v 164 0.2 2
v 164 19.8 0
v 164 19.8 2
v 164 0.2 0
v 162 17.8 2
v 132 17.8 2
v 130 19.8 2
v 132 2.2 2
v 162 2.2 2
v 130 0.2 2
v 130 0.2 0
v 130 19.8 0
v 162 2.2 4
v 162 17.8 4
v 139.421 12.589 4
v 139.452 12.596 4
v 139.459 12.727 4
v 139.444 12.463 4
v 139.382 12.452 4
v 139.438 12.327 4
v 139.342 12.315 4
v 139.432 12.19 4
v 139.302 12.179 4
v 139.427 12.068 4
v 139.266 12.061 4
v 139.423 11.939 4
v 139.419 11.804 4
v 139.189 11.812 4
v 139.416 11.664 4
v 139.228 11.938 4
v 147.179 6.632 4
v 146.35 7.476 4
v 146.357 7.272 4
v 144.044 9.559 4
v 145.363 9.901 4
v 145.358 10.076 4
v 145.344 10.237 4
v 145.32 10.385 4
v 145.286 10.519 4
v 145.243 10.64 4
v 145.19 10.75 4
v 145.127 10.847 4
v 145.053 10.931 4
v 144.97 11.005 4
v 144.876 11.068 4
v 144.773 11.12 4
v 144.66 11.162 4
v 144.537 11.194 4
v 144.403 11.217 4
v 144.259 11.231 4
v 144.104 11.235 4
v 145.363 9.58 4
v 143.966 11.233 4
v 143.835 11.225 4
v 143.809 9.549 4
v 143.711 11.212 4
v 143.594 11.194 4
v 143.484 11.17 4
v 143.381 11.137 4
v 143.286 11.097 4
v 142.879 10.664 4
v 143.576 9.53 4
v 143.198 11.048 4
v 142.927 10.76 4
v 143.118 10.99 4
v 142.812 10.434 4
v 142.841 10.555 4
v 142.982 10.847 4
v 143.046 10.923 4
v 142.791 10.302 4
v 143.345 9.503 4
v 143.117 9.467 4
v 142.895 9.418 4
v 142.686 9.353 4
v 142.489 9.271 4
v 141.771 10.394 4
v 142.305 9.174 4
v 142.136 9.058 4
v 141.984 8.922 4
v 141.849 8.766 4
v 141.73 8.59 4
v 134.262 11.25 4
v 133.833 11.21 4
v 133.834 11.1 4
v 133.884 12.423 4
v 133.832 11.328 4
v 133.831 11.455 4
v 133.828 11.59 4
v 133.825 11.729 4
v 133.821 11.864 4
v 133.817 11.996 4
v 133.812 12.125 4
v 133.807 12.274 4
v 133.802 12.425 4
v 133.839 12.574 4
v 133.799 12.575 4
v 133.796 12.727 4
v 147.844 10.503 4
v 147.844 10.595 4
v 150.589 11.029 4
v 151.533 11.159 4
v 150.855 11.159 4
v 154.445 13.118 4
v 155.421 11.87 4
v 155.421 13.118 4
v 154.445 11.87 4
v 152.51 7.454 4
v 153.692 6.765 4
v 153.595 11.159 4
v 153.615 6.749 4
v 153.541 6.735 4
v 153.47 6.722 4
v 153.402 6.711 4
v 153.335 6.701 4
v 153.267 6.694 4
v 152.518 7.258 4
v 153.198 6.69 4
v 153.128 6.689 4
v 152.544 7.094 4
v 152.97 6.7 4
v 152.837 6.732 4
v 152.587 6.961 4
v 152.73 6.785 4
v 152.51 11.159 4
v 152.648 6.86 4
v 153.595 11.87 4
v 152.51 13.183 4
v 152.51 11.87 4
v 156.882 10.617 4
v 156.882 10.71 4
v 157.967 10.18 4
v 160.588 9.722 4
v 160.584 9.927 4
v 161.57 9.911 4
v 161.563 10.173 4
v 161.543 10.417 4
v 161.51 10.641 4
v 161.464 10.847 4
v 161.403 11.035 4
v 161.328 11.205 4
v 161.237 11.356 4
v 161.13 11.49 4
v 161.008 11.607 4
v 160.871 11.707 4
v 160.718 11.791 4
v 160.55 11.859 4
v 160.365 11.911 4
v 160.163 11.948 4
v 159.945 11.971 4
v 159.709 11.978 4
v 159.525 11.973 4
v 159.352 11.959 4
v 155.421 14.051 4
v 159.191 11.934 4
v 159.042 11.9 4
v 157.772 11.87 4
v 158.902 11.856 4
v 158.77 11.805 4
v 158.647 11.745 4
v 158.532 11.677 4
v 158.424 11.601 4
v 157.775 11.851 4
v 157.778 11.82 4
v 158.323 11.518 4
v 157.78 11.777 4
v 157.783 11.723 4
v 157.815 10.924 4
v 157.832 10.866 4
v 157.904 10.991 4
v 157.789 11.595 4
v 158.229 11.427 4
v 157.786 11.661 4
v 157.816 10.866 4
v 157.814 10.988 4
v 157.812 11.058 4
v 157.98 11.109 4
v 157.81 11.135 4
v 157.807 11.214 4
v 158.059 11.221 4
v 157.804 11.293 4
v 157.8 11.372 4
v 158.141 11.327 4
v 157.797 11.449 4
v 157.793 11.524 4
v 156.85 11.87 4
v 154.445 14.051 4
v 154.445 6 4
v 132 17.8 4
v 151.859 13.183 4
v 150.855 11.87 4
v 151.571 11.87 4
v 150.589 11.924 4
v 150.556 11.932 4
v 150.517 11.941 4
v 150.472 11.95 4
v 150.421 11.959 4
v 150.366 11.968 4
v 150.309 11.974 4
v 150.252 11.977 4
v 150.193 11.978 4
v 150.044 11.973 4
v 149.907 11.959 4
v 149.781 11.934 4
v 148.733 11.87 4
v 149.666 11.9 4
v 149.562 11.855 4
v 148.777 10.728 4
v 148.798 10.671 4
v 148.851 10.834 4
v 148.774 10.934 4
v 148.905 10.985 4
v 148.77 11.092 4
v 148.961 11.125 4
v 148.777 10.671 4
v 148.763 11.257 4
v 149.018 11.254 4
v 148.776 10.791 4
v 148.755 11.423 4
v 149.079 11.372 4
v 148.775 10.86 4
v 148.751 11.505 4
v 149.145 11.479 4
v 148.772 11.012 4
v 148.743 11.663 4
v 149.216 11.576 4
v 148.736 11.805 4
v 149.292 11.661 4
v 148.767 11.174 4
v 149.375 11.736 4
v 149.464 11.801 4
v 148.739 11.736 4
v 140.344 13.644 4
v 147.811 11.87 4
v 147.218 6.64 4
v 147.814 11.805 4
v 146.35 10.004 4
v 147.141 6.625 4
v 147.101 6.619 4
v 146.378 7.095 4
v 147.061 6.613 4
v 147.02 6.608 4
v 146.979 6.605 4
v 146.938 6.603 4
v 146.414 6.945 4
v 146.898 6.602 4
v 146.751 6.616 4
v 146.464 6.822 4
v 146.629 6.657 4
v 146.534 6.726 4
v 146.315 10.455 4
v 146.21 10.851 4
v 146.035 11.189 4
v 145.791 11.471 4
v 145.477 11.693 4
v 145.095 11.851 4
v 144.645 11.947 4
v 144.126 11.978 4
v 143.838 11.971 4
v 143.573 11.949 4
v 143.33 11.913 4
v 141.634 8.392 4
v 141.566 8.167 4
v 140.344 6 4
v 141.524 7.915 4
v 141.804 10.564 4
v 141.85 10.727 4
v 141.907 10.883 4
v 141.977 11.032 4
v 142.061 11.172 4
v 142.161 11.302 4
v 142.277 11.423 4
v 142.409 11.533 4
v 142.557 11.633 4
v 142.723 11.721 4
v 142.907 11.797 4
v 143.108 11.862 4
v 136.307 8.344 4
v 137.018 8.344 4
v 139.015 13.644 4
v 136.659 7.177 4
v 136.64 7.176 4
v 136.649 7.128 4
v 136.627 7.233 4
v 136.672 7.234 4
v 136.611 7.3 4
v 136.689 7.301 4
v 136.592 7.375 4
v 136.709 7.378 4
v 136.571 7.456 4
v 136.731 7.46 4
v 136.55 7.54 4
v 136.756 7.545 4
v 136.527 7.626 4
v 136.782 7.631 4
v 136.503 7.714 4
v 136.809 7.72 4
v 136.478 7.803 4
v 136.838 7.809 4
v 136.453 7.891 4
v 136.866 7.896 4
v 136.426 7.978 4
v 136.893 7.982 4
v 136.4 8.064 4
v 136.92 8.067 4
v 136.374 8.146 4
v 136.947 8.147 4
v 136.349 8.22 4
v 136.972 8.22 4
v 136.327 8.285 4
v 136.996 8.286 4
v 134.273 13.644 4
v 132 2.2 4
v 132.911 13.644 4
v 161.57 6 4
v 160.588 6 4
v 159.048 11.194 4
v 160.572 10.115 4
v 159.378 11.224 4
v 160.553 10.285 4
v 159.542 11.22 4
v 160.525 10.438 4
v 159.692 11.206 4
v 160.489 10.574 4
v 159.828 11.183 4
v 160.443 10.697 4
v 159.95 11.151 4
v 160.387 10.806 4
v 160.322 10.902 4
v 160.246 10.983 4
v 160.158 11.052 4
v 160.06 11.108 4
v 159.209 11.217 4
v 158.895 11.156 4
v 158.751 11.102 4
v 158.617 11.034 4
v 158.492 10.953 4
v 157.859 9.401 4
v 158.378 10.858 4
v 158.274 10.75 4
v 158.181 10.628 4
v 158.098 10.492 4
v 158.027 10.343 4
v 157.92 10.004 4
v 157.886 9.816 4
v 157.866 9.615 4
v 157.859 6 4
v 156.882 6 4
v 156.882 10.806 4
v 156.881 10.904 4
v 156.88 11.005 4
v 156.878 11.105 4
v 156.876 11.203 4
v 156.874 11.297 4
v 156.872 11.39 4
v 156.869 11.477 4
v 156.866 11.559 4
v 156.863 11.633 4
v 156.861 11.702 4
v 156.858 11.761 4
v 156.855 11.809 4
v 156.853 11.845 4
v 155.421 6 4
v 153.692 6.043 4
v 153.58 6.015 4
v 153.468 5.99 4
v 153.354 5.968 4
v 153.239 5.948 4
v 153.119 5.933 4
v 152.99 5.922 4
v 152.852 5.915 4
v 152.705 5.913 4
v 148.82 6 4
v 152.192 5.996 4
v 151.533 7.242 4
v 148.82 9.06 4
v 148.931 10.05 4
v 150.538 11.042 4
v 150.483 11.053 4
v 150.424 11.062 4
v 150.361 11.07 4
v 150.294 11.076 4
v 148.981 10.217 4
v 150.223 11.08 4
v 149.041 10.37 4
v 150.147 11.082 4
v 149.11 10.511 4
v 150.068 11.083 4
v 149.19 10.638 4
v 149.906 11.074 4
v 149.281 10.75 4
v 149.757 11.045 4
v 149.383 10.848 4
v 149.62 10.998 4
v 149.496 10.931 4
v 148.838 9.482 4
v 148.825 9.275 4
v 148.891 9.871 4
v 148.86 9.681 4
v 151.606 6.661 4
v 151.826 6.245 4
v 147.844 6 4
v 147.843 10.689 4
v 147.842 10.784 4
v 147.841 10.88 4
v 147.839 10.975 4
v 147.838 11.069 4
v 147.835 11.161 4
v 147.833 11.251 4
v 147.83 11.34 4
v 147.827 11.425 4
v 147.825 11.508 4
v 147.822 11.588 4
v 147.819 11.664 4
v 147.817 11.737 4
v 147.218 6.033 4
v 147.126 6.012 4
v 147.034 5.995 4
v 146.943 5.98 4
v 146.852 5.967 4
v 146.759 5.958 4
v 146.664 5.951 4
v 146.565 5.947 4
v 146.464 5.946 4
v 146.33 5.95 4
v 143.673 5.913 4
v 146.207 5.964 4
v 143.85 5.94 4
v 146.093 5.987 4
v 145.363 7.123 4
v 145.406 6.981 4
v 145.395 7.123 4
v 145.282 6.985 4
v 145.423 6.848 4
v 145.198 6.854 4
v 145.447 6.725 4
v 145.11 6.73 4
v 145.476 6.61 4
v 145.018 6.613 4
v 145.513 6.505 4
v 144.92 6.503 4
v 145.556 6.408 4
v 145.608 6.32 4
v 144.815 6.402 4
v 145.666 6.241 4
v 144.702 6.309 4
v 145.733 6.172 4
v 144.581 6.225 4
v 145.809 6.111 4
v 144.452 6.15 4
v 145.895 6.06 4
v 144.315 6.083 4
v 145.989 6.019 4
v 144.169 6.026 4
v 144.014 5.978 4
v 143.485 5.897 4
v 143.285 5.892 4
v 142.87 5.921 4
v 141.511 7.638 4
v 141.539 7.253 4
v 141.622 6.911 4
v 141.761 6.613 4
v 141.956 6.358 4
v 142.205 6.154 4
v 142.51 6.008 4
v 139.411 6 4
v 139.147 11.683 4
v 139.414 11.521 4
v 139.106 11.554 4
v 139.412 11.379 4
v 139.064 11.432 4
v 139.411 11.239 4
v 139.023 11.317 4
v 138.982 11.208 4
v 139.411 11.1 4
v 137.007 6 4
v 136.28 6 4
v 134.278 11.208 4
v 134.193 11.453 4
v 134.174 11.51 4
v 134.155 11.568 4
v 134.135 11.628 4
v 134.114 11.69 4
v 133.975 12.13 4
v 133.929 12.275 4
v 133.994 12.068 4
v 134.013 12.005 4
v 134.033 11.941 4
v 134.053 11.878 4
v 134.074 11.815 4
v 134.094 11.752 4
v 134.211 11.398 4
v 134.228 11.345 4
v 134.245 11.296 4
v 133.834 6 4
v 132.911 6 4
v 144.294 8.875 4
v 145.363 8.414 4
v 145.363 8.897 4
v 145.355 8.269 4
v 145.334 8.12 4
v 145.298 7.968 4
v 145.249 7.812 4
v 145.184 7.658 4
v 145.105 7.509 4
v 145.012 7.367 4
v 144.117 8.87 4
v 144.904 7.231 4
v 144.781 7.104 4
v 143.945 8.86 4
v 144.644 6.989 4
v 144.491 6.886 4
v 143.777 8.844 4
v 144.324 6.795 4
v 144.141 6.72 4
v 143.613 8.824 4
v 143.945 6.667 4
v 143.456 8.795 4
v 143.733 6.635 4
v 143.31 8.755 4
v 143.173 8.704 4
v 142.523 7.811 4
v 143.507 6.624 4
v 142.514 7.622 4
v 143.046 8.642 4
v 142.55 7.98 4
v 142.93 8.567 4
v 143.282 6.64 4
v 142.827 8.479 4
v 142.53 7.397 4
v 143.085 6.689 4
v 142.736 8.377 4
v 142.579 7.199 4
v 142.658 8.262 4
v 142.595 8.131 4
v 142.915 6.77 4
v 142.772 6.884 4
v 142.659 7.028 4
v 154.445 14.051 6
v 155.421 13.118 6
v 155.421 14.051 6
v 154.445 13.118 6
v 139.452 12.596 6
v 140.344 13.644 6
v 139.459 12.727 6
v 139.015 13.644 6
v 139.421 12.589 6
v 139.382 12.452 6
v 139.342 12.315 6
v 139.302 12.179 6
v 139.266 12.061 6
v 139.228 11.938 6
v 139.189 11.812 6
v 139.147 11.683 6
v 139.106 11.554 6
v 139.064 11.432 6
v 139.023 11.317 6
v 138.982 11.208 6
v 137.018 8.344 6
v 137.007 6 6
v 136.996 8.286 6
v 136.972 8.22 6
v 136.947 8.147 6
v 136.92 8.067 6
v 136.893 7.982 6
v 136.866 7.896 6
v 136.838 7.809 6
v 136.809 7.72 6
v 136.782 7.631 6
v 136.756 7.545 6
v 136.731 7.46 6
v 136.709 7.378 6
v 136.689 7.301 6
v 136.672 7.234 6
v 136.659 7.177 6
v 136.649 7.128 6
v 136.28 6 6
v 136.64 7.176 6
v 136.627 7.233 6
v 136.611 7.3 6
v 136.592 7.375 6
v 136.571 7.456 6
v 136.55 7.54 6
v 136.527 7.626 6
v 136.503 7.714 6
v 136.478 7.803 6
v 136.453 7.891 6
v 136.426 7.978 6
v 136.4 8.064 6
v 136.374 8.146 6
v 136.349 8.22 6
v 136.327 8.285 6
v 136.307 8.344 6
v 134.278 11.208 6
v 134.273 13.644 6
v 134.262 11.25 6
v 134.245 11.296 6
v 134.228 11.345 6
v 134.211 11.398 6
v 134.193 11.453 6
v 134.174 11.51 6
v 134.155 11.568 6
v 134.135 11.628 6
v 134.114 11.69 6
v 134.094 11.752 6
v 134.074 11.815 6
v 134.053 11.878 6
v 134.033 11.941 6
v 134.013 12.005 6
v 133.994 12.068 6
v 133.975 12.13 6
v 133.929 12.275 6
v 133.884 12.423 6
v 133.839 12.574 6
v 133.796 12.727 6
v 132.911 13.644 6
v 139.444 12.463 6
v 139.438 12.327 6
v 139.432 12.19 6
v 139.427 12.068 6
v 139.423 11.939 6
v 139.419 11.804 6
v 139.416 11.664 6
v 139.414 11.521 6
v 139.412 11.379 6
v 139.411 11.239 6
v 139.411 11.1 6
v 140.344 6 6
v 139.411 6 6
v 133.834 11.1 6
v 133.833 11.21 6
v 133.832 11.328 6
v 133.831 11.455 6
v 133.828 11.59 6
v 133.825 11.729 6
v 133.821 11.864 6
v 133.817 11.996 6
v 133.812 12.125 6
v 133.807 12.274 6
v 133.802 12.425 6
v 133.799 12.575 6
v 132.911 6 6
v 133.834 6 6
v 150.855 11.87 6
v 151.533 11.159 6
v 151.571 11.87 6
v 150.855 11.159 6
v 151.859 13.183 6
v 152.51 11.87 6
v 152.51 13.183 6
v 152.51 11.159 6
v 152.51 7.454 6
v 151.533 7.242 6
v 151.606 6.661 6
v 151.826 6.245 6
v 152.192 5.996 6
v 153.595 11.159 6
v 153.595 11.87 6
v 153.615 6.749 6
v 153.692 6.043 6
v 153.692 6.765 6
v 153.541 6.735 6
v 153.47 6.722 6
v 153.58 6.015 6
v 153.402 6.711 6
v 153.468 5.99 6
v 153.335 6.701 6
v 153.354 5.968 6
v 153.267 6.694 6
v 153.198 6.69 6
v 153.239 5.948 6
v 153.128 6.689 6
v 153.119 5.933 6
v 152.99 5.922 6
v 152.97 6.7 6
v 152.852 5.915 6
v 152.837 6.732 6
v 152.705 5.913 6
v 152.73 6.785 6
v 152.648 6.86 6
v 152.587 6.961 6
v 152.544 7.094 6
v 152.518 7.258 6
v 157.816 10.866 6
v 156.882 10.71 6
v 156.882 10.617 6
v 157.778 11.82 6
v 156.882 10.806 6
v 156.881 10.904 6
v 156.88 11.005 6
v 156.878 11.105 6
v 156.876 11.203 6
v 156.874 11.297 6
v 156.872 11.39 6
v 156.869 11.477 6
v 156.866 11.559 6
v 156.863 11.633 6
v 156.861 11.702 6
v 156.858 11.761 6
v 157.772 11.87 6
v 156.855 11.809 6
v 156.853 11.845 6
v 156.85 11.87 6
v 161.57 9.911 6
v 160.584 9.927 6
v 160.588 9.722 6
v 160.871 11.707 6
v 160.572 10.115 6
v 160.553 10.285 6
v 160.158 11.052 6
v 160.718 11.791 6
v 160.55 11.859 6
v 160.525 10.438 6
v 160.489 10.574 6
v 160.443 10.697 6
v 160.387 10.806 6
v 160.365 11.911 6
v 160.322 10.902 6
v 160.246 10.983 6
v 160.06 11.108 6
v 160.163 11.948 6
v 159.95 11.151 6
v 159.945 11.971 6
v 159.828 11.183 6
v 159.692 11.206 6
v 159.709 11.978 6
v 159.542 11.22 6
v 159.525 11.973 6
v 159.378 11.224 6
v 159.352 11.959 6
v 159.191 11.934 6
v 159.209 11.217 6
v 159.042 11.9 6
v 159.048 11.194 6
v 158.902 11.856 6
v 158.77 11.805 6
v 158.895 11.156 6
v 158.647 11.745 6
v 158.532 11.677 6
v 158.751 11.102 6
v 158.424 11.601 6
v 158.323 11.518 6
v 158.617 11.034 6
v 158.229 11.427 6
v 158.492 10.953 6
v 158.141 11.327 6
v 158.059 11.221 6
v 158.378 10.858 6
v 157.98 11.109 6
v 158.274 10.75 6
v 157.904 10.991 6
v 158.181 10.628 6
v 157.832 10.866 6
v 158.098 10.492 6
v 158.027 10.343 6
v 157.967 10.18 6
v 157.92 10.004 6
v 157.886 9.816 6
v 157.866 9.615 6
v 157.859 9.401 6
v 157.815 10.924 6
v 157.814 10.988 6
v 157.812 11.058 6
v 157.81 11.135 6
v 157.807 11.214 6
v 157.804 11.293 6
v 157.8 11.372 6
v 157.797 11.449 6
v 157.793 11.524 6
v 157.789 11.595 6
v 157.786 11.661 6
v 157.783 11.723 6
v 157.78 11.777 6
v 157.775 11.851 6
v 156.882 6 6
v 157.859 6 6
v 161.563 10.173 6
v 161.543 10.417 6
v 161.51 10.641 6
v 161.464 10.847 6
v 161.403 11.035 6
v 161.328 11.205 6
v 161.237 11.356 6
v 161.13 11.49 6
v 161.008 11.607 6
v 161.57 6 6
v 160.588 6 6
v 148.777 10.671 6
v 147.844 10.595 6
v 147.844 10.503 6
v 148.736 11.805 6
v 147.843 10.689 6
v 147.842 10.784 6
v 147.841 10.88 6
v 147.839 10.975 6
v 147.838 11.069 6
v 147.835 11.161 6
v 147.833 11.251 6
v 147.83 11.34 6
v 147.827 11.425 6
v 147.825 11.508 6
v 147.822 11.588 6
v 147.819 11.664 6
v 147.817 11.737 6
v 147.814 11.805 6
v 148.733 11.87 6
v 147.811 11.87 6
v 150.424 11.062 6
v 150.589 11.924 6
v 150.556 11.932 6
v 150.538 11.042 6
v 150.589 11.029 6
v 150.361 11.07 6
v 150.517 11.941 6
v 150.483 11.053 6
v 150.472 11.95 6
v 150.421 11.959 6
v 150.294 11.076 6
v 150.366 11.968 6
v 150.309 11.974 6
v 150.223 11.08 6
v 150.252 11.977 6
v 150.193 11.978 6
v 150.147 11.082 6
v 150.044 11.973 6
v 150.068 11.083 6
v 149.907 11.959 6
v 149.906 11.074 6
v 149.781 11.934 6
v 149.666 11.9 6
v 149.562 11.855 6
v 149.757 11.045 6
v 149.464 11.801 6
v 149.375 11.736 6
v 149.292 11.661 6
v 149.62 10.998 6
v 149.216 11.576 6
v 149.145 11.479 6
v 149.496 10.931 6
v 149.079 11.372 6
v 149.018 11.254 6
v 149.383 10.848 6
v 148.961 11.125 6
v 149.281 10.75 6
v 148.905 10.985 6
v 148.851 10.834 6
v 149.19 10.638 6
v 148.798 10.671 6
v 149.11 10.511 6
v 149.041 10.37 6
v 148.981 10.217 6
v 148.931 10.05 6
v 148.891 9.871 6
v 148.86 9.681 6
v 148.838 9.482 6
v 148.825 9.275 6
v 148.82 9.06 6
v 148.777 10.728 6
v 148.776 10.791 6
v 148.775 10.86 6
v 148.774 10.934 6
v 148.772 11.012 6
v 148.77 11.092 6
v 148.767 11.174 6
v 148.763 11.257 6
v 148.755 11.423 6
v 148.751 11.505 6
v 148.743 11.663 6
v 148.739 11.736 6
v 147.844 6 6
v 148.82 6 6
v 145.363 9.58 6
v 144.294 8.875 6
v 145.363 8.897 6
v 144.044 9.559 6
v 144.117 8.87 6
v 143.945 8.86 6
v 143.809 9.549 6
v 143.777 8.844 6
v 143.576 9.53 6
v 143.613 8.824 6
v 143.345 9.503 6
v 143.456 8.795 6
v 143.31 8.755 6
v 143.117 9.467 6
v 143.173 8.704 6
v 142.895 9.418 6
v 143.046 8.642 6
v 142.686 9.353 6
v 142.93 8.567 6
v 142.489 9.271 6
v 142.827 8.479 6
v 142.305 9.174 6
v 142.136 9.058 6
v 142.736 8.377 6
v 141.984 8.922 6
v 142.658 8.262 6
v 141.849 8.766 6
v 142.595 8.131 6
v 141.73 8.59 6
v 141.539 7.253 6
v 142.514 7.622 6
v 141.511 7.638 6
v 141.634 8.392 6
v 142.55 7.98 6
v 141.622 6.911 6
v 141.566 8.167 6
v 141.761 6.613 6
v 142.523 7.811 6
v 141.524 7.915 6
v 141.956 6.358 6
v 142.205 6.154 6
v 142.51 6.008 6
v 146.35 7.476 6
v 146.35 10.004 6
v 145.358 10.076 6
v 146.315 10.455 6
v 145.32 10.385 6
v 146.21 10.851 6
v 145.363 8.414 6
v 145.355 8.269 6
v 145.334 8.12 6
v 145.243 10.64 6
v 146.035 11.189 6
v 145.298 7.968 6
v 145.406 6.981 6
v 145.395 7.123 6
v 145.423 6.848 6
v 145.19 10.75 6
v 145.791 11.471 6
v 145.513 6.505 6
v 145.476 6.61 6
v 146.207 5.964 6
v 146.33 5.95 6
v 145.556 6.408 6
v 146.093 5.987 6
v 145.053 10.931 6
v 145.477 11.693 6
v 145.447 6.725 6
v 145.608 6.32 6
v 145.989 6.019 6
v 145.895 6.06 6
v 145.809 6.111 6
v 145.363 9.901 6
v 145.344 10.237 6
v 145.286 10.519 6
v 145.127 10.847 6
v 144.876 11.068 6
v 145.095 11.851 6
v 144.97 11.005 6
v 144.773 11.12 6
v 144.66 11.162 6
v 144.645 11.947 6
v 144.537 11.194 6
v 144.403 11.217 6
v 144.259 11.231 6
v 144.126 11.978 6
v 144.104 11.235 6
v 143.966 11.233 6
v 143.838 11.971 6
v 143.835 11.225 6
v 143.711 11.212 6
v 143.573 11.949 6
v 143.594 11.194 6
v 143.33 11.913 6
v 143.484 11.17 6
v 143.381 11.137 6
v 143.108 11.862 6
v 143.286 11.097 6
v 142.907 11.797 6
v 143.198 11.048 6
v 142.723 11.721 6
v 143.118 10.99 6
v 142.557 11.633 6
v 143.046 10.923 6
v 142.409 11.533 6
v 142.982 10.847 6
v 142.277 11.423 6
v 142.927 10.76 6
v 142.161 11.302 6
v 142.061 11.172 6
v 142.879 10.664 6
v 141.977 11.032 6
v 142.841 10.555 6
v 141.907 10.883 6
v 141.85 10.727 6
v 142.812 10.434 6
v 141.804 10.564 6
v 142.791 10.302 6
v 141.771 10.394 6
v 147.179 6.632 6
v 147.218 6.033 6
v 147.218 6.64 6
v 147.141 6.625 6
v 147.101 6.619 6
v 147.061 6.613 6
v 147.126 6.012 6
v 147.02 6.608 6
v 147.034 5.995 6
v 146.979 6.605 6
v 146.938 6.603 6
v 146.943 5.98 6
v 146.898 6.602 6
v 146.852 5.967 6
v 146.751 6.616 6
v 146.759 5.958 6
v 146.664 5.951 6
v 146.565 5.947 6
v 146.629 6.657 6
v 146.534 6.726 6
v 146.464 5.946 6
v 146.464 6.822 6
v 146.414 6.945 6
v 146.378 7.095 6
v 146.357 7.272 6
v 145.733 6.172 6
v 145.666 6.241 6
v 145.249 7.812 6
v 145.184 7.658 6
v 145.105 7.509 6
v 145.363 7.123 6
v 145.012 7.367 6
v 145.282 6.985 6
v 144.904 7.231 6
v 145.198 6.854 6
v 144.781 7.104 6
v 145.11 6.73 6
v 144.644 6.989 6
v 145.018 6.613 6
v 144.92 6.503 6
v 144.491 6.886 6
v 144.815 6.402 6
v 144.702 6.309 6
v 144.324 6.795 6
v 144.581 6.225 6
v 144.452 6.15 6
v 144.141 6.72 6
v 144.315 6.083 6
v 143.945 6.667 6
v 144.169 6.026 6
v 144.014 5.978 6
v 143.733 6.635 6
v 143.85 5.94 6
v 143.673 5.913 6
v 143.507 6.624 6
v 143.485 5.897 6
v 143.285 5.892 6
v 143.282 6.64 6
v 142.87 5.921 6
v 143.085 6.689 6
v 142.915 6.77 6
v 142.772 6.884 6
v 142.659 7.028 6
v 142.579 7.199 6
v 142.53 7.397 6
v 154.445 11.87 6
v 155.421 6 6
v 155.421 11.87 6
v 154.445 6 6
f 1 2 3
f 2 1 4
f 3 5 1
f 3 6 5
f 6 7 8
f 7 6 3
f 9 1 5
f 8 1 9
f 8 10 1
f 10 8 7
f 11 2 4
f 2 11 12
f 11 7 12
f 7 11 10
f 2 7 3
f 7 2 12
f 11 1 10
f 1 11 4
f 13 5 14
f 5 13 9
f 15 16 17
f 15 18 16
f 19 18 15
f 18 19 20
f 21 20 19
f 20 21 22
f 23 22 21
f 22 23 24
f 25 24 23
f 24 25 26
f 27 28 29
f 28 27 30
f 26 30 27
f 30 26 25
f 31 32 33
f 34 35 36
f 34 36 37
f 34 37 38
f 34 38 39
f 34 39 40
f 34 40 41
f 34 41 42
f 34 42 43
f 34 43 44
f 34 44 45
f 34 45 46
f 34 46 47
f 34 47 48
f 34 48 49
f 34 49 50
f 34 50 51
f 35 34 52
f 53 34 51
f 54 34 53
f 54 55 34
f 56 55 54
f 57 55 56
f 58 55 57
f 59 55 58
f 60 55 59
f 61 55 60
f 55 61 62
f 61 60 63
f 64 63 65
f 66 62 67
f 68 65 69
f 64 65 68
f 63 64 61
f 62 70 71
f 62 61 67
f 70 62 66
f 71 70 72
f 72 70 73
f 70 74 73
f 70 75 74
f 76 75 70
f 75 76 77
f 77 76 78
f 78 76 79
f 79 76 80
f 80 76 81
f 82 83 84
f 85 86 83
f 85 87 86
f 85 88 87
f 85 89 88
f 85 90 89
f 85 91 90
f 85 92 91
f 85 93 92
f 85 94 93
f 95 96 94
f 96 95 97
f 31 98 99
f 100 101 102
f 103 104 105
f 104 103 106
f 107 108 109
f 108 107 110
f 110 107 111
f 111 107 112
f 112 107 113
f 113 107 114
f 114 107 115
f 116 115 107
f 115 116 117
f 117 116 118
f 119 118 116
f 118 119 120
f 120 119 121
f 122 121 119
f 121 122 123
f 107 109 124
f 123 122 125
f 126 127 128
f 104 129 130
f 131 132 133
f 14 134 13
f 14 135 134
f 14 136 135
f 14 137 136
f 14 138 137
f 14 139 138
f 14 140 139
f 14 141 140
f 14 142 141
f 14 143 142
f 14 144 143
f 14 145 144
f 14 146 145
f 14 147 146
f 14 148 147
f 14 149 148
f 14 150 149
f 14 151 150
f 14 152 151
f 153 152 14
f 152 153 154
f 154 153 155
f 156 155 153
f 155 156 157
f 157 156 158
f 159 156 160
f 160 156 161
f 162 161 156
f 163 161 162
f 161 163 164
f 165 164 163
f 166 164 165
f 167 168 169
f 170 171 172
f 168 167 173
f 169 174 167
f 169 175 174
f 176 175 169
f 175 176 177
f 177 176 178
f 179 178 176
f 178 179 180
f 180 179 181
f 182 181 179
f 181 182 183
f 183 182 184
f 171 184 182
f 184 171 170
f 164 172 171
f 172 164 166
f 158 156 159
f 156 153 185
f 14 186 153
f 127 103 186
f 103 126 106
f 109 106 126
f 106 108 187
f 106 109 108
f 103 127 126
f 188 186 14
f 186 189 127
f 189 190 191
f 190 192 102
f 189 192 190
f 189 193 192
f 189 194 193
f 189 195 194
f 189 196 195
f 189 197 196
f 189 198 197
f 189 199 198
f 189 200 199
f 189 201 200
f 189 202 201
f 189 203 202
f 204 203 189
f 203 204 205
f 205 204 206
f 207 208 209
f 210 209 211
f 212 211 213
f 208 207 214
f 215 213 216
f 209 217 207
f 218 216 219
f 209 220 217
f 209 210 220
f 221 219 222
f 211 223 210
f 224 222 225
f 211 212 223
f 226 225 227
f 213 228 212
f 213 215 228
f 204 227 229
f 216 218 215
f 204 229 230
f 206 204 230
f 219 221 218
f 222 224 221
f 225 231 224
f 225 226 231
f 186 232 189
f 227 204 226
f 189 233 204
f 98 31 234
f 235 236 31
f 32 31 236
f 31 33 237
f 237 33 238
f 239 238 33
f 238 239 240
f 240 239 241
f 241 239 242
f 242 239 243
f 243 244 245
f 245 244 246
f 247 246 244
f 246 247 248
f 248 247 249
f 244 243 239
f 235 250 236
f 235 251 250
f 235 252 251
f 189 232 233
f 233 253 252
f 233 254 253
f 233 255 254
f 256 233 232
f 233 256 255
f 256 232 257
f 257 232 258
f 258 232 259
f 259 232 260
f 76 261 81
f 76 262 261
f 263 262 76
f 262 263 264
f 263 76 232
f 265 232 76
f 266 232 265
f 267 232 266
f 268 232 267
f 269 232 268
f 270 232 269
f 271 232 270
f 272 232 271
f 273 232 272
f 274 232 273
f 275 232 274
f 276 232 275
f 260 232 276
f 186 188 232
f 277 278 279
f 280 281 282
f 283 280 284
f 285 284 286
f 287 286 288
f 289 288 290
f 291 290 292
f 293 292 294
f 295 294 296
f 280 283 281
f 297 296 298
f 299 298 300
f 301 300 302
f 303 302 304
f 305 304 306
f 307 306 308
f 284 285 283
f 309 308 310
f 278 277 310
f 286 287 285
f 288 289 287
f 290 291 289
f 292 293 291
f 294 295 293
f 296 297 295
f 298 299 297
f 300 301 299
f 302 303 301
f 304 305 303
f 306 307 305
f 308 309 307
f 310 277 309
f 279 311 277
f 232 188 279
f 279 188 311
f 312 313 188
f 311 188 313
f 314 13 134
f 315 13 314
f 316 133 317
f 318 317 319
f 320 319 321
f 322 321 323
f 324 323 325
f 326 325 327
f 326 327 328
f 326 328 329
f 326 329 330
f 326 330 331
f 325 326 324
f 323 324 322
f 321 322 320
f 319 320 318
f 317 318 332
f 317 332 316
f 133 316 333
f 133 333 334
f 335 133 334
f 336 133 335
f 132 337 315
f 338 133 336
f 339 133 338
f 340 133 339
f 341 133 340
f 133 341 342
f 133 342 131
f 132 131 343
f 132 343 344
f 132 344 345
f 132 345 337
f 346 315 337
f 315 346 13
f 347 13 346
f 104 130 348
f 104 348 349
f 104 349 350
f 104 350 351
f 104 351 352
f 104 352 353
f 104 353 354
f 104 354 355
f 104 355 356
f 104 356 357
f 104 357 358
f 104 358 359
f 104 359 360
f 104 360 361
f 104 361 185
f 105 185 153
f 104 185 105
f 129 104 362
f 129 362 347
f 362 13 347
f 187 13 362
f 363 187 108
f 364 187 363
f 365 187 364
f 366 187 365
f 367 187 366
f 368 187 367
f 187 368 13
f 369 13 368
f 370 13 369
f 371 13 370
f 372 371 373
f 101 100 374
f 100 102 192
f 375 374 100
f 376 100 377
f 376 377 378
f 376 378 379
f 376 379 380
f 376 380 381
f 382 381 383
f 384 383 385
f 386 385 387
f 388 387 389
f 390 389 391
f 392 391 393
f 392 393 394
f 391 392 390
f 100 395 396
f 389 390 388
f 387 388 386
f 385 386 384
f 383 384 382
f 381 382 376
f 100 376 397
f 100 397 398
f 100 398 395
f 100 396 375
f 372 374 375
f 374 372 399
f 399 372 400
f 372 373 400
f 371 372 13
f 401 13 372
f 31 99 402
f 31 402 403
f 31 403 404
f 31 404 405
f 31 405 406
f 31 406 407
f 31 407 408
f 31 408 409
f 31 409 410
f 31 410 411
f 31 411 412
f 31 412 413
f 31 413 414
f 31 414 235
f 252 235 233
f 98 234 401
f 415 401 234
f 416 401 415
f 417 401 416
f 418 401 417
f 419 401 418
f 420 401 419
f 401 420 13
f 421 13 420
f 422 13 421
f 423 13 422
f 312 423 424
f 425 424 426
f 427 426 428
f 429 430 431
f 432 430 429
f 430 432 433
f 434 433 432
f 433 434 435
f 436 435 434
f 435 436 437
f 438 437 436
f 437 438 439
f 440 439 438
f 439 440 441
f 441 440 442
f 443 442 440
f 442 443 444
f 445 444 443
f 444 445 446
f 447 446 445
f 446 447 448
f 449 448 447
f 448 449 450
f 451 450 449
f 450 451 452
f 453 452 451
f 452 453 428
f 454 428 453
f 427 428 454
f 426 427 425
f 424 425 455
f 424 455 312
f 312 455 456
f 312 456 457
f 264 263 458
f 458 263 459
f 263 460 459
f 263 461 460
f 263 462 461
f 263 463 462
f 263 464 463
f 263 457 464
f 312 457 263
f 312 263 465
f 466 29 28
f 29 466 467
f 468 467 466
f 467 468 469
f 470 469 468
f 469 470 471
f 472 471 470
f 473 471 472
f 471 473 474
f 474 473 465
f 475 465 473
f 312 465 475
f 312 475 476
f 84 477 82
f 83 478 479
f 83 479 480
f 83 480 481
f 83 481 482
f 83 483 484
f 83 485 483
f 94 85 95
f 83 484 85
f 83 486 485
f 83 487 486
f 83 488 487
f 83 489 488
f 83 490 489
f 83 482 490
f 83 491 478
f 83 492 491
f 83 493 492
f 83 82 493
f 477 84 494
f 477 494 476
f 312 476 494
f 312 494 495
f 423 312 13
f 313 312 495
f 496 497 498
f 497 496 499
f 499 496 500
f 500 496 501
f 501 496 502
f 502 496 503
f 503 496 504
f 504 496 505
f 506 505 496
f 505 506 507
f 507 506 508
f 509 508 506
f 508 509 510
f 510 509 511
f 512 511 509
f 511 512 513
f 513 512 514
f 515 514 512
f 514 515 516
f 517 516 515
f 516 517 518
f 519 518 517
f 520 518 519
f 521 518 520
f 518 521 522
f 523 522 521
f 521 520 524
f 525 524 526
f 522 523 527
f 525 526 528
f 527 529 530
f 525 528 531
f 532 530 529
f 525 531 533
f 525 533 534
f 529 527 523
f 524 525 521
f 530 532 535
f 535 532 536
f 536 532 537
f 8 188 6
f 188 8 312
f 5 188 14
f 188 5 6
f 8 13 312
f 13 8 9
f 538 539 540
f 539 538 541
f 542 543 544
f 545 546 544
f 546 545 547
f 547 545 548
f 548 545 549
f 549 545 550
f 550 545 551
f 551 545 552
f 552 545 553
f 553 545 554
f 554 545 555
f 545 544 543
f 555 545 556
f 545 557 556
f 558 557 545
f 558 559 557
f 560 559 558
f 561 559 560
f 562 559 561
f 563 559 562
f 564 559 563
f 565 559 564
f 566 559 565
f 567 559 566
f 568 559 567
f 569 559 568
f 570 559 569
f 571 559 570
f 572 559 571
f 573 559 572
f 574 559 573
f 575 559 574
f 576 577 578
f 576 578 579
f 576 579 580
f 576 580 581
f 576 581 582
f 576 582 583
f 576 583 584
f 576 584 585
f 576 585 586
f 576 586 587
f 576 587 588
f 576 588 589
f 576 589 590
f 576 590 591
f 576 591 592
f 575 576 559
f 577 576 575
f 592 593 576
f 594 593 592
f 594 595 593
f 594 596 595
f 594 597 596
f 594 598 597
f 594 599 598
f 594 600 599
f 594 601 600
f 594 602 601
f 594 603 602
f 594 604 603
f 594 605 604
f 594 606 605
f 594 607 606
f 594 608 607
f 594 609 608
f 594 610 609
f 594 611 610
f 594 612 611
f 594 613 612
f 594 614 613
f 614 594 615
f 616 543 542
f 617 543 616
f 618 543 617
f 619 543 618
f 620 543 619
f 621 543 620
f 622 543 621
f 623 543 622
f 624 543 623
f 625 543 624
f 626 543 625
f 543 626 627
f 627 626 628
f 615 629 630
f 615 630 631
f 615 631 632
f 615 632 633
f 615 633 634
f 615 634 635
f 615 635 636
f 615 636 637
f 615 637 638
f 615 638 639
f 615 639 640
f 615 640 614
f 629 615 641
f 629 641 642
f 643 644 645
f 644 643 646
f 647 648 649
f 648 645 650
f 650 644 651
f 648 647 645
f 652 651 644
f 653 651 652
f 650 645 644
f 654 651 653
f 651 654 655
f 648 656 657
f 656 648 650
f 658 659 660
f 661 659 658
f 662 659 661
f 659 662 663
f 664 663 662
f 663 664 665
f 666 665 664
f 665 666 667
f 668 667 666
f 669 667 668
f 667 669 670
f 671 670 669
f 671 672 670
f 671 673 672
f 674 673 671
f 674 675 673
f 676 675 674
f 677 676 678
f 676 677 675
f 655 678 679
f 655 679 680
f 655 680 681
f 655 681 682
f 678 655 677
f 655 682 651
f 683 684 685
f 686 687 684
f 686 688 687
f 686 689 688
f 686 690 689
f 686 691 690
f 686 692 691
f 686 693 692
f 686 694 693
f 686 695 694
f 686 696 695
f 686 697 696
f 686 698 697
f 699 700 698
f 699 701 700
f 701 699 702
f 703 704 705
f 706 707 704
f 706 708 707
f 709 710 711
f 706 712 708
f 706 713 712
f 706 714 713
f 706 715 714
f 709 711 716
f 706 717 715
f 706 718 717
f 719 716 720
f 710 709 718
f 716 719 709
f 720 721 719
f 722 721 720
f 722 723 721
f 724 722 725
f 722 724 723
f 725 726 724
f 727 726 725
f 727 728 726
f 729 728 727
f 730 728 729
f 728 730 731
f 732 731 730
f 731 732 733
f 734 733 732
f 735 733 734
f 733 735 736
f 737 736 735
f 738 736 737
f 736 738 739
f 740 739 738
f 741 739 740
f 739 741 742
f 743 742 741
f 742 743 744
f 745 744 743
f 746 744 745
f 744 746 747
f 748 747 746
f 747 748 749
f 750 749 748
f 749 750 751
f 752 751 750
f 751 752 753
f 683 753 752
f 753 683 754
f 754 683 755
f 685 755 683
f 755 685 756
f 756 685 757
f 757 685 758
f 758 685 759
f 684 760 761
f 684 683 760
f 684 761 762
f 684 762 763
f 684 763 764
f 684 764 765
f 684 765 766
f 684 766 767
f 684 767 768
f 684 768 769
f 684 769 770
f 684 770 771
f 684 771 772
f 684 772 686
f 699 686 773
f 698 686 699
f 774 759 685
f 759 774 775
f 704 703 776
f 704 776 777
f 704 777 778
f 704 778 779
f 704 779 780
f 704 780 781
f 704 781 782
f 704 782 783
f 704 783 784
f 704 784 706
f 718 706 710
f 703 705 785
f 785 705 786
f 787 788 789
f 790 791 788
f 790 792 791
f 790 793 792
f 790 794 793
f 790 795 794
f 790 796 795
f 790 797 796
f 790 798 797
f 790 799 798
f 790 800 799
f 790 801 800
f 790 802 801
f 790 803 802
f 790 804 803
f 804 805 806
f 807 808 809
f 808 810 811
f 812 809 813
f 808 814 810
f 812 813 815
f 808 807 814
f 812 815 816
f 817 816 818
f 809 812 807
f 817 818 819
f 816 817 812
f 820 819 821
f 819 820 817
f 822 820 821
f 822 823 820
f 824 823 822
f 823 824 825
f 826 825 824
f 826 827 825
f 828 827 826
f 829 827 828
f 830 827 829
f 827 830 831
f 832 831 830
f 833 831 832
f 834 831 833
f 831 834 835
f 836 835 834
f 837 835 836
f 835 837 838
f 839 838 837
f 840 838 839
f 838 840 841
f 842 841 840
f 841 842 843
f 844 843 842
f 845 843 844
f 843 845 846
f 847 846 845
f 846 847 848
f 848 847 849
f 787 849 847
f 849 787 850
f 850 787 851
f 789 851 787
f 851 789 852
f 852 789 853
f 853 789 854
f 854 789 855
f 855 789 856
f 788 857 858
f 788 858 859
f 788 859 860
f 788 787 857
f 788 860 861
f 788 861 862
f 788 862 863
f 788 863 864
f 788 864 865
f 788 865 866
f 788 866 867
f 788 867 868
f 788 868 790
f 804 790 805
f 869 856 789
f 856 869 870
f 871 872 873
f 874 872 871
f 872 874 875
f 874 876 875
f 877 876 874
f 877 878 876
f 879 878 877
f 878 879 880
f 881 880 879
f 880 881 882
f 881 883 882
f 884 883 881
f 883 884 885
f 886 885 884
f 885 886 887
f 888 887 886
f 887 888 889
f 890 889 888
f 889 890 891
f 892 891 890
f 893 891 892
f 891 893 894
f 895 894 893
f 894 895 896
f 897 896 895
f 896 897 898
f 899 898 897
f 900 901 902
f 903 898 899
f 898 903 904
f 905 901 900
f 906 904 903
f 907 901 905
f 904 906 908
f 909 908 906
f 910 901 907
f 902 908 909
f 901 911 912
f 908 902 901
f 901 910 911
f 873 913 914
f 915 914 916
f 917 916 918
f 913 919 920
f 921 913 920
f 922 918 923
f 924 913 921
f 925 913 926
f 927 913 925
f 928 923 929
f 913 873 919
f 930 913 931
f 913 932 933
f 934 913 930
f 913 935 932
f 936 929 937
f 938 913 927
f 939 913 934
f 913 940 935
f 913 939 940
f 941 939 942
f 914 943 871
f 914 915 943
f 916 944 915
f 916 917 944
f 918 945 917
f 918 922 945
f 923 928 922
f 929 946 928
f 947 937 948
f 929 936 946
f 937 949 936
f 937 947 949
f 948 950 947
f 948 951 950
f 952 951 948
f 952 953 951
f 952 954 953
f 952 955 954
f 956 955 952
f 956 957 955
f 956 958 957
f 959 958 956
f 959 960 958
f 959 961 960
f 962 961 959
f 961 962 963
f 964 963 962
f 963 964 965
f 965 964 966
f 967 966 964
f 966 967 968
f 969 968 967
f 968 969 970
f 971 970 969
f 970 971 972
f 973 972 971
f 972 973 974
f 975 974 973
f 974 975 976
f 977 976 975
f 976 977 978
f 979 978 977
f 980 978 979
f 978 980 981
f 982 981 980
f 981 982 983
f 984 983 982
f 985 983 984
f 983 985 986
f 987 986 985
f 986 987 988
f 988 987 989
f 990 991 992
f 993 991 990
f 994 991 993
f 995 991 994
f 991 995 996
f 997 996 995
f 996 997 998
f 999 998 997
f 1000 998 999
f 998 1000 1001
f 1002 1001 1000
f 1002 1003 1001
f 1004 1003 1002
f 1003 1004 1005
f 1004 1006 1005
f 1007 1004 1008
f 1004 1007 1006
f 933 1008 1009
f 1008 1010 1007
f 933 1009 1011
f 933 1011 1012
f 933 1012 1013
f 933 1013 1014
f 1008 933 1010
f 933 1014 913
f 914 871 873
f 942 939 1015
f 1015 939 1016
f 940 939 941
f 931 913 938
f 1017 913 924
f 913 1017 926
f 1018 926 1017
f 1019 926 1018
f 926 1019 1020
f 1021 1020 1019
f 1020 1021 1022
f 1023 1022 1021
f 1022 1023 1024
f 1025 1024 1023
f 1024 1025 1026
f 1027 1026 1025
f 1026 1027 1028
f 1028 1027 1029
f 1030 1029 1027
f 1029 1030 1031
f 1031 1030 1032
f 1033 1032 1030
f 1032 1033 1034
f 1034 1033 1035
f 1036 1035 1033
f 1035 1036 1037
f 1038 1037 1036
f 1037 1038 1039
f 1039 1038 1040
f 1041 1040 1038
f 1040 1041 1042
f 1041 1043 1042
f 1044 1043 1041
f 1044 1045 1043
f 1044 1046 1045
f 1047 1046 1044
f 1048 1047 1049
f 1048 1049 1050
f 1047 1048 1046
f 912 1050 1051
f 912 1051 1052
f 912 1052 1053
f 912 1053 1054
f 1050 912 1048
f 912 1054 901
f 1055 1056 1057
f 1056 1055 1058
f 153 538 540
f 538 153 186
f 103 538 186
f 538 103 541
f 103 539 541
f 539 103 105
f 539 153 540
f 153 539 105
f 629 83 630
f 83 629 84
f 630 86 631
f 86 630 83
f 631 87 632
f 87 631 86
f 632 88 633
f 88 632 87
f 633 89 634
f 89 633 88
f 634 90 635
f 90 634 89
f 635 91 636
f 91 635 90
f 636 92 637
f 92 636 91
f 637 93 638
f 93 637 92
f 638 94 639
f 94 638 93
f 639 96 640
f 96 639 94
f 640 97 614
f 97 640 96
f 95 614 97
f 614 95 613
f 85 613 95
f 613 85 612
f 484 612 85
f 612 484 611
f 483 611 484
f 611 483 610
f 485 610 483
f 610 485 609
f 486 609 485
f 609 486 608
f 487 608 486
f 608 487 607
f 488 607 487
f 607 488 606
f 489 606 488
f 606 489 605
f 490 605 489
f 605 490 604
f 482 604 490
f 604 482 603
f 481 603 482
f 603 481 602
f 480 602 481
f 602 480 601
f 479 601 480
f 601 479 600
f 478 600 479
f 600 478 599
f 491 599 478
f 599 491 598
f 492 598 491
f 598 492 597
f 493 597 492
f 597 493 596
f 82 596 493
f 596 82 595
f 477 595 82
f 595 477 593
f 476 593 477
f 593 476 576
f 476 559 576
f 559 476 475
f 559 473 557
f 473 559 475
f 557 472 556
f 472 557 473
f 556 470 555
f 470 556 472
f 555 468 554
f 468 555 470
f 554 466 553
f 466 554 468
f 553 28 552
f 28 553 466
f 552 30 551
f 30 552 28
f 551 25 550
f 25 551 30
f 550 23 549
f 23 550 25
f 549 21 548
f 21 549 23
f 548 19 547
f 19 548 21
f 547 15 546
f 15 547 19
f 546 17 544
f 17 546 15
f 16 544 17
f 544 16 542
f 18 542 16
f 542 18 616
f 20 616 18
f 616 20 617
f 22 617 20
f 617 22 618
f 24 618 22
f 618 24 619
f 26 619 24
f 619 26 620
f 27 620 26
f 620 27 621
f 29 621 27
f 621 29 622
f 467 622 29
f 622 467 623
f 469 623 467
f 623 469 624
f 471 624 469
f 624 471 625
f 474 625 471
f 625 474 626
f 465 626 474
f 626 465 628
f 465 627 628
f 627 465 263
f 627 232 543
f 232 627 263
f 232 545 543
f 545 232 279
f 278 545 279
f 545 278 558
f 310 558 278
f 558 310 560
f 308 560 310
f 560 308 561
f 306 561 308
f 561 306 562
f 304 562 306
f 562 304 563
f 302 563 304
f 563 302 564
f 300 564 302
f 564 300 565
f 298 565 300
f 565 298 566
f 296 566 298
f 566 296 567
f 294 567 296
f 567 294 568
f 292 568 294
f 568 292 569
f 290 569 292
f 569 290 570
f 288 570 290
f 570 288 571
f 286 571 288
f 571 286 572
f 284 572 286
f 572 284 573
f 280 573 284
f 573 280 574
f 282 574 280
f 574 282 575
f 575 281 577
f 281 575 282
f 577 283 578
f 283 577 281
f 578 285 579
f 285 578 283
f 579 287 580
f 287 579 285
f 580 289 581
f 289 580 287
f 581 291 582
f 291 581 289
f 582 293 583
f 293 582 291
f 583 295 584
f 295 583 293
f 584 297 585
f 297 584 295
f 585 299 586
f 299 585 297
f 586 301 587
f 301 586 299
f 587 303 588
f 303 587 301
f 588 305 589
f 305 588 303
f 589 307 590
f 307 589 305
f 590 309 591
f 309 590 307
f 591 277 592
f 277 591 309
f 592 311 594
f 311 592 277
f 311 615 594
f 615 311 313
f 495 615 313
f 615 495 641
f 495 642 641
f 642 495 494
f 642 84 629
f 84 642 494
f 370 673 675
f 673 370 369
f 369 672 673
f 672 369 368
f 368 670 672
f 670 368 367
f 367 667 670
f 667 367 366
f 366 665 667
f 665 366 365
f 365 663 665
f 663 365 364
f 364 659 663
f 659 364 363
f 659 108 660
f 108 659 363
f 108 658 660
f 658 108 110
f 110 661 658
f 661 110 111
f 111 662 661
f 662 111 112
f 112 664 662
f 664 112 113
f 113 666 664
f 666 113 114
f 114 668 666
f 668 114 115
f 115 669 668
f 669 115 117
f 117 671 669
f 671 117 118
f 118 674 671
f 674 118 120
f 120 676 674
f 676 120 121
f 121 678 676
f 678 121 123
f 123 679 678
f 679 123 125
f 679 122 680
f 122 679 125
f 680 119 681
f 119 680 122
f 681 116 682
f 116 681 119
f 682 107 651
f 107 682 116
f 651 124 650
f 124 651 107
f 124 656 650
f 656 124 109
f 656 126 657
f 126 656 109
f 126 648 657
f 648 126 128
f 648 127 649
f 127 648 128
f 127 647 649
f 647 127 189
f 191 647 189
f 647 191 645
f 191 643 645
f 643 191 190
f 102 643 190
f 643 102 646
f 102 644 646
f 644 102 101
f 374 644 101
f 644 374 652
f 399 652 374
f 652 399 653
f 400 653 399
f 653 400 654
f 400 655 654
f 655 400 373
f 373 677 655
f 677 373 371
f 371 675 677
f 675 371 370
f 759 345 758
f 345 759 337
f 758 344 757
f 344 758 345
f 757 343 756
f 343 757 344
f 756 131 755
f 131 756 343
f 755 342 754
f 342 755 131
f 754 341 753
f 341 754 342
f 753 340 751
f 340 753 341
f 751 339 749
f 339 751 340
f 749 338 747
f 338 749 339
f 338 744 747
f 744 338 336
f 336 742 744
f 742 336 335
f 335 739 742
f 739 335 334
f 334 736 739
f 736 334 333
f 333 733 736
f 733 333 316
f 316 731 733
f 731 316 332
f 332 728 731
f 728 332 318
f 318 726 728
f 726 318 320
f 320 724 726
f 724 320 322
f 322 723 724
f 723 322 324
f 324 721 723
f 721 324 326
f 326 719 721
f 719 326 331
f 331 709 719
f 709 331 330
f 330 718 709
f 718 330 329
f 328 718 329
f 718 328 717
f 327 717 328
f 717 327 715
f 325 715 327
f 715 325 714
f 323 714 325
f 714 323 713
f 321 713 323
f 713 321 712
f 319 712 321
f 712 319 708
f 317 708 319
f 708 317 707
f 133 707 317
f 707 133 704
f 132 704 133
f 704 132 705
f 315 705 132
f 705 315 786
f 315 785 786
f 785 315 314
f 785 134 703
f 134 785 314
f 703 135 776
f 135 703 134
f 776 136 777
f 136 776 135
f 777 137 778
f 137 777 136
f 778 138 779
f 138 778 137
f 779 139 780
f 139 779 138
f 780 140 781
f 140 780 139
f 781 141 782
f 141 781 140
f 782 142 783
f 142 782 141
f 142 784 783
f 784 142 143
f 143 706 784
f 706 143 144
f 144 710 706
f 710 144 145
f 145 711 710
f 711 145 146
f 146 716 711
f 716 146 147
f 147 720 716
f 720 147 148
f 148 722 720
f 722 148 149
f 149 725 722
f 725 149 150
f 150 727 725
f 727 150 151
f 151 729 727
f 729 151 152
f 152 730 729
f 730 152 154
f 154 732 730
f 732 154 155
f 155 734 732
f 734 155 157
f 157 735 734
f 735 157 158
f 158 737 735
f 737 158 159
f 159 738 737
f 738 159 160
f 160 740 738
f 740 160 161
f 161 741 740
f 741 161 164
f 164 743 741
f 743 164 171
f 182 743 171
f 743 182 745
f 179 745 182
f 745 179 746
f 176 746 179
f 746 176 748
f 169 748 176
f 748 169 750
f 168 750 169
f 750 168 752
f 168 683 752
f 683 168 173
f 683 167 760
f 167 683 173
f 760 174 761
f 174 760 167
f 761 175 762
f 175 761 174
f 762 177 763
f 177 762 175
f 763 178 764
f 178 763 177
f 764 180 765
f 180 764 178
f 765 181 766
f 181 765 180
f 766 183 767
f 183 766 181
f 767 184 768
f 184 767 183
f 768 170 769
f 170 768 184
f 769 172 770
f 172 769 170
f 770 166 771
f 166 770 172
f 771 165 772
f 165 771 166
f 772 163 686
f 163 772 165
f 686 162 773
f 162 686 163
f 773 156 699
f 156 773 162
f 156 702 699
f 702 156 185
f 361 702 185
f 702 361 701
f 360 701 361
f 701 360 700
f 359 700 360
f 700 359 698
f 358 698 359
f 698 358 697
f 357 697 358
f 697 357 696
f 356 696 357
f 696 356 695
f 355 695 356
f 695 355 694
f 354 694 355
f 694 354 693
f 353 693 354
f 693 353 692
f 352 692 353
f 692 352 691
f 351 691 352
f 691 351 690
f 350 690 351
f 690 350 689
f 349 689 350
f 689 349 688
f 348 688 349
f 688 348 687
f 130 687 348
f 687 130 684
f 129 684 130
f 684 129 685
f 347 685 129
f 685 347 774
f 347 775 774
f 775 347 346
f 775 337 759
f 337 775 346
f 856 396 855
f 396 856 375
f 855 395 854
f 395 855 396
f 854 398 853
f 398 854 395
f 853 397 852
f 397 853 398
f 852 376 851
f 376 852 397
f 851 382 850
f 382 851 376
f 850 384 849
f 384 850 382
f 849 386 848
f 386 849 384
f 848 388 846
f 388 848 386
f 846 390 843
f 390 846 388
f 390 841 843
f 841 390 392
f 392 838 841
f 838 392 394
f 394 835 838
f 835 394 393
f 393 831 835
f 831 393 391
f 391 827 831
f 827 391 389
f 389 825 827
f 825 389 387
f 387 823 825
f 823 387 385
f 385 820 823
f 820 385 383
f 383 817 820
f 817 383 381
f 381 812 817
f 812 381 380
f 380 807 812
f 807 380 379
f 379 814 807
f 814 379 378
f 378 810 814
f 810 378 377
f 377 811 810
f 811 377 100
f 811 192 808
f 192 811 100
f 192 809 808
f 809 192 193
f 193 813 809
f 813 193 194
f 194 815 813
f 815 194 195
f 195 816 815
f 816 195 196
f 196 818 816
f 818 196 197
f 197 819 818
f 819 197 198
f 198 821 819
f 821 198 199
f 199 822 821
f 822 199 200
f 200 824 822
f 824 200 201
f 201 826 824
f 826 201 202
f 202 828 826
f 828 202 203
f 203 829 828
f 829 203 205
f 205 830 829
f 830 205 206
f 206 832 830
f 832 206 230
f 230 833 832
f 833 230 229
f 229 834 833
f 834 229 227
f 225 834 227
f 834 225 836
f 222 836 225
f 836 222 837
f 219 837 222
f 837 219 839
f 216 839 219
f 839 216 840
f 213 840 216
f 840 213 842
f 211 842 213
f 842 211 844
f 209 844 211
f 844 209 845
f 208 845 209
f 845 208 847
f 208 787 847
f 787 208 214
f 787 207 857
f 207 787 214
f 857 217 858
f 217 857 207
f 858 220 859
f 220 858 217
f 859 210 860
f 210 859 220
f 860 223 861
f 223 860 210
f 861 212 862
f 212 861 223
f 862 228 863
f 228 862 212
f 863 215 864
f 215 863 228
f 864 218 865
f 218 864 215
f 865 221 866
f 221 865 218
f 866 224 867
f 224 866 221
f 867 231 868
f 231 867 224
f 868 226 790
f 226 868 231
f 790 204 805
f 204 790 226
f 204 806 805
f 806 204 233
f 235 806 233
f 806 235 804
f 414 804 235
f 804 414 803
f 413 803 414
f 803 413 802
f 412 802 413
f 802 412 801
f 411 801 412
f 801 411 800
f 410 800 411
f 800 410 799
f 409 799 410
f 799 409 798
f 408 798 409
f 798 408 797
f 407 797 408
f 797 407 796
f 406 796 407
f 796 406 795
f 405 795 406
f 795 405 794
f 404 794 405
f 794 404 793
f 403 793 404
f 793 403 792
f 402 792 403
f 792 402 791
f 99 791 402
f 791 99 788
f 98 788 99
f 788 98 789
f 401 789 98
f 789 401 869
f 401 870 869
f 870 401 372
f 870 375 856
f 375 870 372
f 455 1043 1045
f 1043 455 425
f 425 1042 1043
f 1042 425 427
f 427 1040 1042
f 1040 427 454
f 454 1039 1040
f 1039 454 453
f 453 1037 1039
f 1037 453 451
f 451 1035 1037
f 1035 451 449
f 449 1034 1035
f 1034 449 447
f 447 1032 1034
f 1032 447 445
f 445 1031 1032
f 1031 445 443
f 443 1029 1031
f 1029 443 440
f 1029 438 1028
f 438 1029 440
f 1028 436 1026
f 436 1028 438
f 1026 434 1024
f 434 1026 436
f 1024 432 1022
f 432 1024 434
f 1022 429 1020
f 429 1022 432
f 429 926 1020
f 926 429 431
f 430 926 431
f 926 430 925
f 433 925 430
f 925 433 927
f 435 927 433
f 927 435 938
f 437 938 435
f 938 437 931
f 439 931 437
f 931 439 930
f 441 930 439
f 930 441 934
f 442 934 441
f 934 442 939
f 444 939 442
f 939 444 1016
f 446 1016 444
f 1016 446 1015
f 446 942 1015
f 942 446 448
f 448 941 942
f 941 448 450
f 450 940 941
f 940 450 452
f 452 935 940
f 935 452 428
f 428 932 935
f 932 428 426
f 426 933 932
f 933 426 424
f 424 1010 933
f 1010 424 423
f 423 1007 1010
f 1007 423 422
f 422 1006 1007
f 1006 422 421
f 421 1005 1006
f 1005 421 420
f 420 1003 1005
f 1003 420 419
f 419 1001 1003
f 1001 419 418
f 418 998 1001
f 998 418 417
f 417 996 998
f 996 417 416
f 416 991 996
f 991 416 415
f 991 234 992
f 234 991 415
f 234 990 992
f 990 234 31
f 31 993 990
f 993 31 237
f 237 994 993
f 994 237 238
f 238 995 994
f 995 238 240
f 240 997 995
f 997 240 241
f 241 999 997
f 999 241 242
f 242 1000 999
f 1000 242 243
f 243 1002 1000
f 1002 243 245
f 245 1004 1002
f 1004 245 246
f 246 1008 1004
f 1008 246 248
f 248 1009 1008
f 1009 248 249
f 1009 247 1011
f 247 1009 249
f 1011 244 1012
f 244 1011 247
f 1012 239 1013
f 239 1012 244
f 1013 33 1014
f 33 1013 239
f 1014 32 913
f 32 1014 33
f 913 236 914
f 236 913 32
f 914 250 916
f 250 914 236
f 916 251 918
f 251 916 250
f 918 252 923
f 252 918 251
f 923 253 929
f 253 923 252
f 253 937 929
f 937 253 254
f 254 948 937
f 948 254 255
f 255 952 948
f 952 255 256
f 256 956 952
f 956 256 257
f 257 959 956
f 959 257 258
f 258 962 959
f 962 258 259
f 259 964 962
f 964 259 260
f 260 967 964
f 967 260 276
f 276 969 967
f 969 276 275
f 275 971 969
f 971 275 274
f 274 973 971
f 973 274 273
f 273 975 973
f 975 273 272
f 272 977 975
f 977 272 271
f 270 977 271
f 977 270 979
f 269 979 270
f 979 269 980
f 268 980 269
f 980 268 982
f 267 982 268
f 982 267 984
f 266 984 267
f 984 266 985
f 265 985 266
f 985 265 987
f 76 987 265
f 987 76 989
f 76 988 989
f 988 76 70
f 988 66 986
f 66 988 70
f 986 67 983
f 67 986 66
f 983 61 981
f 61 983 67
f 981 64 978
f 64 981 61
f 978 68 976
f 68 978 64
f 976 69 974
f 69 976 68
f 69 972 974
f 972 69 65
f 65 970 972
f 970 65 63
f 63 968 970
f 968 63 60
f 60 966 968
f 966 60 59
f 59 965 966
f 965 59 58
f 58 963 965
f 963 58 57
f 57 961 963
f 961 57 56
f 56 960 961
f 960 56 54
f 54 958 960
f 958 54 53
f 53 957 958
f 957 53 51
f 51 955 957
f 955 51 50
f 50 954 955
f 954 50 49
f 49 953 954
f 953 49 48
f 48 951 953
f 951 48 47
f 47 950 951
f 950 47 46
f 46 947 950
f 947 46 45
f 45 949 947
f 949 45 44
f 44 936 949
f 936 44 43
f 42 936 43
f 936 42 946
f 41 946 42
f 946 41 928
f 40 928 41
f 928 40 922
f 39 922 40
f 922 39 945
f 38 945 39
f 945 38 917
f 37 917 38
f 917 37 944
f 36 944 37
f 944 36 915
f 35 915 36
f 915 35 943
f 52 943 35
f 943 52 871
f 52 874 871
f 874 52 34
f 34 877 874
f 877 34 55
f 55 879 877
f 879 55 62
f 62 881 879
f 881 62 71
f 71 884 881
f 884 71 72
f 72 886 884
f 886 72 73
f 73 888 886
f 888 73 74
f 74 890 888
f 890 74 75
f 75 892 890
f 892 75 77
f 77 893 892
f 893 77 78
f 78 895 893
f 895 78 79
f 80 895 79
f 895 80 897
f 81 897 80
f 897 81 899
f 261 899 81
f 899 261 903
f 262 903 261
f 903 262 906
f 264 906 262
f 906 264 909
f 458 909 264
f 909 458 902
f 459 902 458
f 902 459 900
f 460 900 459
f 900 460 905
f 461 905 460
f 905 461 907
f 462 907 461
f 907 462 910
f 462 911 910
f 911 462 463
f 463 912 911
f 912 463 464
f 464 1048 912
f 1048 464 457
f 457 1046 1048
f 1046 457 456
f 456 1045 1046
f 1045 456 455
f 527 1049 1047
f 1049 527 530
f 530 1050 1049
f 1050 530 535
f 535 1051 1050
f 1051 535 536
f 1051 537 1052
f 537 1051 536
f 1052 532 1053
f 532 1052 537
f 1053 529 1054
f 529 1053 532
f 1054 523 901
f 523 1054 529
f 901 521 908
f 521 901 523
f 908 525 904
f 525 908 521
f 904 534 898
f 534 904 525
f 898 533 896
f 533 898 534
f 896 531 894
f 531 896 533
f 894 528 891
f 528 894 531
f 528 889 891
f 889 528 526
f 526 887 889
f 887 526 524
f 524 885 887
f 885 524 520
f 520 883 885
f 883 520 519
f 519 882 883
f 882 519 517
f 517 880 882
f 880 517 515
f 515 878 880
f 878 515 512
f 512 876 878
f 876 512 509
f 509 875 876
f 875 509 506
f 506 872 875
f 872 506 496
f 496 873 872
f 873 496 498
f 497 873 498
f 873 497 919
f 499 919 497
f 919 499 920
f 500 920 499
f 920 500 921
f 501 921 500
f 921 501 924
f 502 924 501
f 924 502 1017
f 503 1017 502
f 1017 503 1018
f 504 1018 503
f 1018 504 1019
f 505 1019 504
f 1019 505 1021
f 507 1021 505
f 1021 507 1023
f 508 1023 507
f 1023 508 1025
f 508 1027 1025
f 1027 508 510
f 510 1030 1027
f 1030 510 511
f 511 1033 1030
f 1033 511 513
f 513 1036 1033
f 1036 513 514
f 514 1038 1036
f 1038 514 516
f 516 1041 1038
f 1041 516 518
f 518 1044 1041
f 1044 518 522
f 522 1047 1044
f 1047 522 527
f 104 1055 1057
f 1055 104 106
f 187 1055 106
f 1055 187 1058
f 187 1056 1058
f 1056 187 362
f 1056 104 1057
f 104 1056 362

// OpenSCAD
/*
 * Who is cleaning this week
 * (c) 2020 David Mikulik
 * Licensed under 
 *   Creative Commons 
 *   Attribution Non Comercial Share alike license
 */
 
THIKNES = 2;
MAIN_BOARD_TEXT = "Tento týden uklízí";
MAIN_BOARD_WIDTH = 120;
MAIN_BOARD_HEIGHT = 100;

TEXTPAD_WIDTH = 34;
TEXTPAD_HEIGHT = 20;
TEXTPAD_NAME = "Martin";
/*
mainBoard();

translate ([MAIN_BOARD_WIDTH/2-TEXTPAD_WIDTH/2,MAIN_BOARD_HEIGHT-40,THIKNES])
    rails();

translate ([TEXTPAD_WIDTH/8,MAIN_BOARD_HEIGHT-76,THIKNES])
    rails();
translate ([MAIN_BOARD_WIDTH-TEXTPAD_WIDTH-TEXTPAD_WIDTH/8,MAIN_BOARD_HEIGHT-76,THIKNES])
    rails();
*/
translate ([MAIN_BOARD_WIDTH+10,0,0]) textPad (false);   

module mainBoard () {
    cube ([MAIN_BOARD_WIDTH, MAIN_BOARD_HEIGHT, THIKNES]);
    translate ([8,MAIN_BOARD_HEIGHT-0-MAIN_BOARD_HEIGHT/4,THIKNES])
        cube ([MAIN_BOARD_WIDTH-12, MAIN_BOARD_HEIGHT/4, THIKNES*5]);
    translate ([8,MAIN_BOARD_HEIGHT-0-MAIN_BOARD_HEIGHT/4+5,THIKNES*6])
        rotate ([0,0,0])
            linear_extrude(2) 
                text(MAIN_BOARD_TEXT);
}

module textPad (bigger) {
    translate ([0,bigger?0:0.2, 0])
    cube ([bigger?TEXTPAD_WIDTH*2:TEXTPAD_WIDTH, bigger?TEXTPAD_HEIGHT+.2:bigger?TEXTPAD_HEIGHT:TEXTPAD_HEIGHT-0.4, bigger?THIKNES+.2:THIKNES]);
    translate ([THIKNES,bigger?TIHNES:THIKNES+0.2, THIKNES])
        cube ([bigger?TEXTPAD_WIDTH*2:TEXTPAD_WIDTH-THIKNES*2, bigger?TEXTPAD_HEIGHT-THIKNES*2:TEXTPAD_HEIGHT-THIKNES*2-0.4, THIKNES]);
    translate ([2,TEXTPAD_HEIGHT/2-4,THIKNES*2])
        rotate ([0,0,0])
            linear_extrude(2) 
                text(TEXTPAD_NAME, size = 8);    
}

module rails () {
    difference () 
    {
        union () {
            cube ([TEXTPAD_WIDTH, THIKNES*4, THIKNES*5]);
            translate ([0,-TEXTPAD_HEIGHT-THIKNES*2-.4, 0])
                cube ([TEXTPAD_WIDTH, THIKNES*4, THIKNES*5]);
        }
        translate ([0,-TEXTPAD_HEIGHT+THIKNES-0.2, THIKNES*3])
            textPad(true);
    }
}
    
